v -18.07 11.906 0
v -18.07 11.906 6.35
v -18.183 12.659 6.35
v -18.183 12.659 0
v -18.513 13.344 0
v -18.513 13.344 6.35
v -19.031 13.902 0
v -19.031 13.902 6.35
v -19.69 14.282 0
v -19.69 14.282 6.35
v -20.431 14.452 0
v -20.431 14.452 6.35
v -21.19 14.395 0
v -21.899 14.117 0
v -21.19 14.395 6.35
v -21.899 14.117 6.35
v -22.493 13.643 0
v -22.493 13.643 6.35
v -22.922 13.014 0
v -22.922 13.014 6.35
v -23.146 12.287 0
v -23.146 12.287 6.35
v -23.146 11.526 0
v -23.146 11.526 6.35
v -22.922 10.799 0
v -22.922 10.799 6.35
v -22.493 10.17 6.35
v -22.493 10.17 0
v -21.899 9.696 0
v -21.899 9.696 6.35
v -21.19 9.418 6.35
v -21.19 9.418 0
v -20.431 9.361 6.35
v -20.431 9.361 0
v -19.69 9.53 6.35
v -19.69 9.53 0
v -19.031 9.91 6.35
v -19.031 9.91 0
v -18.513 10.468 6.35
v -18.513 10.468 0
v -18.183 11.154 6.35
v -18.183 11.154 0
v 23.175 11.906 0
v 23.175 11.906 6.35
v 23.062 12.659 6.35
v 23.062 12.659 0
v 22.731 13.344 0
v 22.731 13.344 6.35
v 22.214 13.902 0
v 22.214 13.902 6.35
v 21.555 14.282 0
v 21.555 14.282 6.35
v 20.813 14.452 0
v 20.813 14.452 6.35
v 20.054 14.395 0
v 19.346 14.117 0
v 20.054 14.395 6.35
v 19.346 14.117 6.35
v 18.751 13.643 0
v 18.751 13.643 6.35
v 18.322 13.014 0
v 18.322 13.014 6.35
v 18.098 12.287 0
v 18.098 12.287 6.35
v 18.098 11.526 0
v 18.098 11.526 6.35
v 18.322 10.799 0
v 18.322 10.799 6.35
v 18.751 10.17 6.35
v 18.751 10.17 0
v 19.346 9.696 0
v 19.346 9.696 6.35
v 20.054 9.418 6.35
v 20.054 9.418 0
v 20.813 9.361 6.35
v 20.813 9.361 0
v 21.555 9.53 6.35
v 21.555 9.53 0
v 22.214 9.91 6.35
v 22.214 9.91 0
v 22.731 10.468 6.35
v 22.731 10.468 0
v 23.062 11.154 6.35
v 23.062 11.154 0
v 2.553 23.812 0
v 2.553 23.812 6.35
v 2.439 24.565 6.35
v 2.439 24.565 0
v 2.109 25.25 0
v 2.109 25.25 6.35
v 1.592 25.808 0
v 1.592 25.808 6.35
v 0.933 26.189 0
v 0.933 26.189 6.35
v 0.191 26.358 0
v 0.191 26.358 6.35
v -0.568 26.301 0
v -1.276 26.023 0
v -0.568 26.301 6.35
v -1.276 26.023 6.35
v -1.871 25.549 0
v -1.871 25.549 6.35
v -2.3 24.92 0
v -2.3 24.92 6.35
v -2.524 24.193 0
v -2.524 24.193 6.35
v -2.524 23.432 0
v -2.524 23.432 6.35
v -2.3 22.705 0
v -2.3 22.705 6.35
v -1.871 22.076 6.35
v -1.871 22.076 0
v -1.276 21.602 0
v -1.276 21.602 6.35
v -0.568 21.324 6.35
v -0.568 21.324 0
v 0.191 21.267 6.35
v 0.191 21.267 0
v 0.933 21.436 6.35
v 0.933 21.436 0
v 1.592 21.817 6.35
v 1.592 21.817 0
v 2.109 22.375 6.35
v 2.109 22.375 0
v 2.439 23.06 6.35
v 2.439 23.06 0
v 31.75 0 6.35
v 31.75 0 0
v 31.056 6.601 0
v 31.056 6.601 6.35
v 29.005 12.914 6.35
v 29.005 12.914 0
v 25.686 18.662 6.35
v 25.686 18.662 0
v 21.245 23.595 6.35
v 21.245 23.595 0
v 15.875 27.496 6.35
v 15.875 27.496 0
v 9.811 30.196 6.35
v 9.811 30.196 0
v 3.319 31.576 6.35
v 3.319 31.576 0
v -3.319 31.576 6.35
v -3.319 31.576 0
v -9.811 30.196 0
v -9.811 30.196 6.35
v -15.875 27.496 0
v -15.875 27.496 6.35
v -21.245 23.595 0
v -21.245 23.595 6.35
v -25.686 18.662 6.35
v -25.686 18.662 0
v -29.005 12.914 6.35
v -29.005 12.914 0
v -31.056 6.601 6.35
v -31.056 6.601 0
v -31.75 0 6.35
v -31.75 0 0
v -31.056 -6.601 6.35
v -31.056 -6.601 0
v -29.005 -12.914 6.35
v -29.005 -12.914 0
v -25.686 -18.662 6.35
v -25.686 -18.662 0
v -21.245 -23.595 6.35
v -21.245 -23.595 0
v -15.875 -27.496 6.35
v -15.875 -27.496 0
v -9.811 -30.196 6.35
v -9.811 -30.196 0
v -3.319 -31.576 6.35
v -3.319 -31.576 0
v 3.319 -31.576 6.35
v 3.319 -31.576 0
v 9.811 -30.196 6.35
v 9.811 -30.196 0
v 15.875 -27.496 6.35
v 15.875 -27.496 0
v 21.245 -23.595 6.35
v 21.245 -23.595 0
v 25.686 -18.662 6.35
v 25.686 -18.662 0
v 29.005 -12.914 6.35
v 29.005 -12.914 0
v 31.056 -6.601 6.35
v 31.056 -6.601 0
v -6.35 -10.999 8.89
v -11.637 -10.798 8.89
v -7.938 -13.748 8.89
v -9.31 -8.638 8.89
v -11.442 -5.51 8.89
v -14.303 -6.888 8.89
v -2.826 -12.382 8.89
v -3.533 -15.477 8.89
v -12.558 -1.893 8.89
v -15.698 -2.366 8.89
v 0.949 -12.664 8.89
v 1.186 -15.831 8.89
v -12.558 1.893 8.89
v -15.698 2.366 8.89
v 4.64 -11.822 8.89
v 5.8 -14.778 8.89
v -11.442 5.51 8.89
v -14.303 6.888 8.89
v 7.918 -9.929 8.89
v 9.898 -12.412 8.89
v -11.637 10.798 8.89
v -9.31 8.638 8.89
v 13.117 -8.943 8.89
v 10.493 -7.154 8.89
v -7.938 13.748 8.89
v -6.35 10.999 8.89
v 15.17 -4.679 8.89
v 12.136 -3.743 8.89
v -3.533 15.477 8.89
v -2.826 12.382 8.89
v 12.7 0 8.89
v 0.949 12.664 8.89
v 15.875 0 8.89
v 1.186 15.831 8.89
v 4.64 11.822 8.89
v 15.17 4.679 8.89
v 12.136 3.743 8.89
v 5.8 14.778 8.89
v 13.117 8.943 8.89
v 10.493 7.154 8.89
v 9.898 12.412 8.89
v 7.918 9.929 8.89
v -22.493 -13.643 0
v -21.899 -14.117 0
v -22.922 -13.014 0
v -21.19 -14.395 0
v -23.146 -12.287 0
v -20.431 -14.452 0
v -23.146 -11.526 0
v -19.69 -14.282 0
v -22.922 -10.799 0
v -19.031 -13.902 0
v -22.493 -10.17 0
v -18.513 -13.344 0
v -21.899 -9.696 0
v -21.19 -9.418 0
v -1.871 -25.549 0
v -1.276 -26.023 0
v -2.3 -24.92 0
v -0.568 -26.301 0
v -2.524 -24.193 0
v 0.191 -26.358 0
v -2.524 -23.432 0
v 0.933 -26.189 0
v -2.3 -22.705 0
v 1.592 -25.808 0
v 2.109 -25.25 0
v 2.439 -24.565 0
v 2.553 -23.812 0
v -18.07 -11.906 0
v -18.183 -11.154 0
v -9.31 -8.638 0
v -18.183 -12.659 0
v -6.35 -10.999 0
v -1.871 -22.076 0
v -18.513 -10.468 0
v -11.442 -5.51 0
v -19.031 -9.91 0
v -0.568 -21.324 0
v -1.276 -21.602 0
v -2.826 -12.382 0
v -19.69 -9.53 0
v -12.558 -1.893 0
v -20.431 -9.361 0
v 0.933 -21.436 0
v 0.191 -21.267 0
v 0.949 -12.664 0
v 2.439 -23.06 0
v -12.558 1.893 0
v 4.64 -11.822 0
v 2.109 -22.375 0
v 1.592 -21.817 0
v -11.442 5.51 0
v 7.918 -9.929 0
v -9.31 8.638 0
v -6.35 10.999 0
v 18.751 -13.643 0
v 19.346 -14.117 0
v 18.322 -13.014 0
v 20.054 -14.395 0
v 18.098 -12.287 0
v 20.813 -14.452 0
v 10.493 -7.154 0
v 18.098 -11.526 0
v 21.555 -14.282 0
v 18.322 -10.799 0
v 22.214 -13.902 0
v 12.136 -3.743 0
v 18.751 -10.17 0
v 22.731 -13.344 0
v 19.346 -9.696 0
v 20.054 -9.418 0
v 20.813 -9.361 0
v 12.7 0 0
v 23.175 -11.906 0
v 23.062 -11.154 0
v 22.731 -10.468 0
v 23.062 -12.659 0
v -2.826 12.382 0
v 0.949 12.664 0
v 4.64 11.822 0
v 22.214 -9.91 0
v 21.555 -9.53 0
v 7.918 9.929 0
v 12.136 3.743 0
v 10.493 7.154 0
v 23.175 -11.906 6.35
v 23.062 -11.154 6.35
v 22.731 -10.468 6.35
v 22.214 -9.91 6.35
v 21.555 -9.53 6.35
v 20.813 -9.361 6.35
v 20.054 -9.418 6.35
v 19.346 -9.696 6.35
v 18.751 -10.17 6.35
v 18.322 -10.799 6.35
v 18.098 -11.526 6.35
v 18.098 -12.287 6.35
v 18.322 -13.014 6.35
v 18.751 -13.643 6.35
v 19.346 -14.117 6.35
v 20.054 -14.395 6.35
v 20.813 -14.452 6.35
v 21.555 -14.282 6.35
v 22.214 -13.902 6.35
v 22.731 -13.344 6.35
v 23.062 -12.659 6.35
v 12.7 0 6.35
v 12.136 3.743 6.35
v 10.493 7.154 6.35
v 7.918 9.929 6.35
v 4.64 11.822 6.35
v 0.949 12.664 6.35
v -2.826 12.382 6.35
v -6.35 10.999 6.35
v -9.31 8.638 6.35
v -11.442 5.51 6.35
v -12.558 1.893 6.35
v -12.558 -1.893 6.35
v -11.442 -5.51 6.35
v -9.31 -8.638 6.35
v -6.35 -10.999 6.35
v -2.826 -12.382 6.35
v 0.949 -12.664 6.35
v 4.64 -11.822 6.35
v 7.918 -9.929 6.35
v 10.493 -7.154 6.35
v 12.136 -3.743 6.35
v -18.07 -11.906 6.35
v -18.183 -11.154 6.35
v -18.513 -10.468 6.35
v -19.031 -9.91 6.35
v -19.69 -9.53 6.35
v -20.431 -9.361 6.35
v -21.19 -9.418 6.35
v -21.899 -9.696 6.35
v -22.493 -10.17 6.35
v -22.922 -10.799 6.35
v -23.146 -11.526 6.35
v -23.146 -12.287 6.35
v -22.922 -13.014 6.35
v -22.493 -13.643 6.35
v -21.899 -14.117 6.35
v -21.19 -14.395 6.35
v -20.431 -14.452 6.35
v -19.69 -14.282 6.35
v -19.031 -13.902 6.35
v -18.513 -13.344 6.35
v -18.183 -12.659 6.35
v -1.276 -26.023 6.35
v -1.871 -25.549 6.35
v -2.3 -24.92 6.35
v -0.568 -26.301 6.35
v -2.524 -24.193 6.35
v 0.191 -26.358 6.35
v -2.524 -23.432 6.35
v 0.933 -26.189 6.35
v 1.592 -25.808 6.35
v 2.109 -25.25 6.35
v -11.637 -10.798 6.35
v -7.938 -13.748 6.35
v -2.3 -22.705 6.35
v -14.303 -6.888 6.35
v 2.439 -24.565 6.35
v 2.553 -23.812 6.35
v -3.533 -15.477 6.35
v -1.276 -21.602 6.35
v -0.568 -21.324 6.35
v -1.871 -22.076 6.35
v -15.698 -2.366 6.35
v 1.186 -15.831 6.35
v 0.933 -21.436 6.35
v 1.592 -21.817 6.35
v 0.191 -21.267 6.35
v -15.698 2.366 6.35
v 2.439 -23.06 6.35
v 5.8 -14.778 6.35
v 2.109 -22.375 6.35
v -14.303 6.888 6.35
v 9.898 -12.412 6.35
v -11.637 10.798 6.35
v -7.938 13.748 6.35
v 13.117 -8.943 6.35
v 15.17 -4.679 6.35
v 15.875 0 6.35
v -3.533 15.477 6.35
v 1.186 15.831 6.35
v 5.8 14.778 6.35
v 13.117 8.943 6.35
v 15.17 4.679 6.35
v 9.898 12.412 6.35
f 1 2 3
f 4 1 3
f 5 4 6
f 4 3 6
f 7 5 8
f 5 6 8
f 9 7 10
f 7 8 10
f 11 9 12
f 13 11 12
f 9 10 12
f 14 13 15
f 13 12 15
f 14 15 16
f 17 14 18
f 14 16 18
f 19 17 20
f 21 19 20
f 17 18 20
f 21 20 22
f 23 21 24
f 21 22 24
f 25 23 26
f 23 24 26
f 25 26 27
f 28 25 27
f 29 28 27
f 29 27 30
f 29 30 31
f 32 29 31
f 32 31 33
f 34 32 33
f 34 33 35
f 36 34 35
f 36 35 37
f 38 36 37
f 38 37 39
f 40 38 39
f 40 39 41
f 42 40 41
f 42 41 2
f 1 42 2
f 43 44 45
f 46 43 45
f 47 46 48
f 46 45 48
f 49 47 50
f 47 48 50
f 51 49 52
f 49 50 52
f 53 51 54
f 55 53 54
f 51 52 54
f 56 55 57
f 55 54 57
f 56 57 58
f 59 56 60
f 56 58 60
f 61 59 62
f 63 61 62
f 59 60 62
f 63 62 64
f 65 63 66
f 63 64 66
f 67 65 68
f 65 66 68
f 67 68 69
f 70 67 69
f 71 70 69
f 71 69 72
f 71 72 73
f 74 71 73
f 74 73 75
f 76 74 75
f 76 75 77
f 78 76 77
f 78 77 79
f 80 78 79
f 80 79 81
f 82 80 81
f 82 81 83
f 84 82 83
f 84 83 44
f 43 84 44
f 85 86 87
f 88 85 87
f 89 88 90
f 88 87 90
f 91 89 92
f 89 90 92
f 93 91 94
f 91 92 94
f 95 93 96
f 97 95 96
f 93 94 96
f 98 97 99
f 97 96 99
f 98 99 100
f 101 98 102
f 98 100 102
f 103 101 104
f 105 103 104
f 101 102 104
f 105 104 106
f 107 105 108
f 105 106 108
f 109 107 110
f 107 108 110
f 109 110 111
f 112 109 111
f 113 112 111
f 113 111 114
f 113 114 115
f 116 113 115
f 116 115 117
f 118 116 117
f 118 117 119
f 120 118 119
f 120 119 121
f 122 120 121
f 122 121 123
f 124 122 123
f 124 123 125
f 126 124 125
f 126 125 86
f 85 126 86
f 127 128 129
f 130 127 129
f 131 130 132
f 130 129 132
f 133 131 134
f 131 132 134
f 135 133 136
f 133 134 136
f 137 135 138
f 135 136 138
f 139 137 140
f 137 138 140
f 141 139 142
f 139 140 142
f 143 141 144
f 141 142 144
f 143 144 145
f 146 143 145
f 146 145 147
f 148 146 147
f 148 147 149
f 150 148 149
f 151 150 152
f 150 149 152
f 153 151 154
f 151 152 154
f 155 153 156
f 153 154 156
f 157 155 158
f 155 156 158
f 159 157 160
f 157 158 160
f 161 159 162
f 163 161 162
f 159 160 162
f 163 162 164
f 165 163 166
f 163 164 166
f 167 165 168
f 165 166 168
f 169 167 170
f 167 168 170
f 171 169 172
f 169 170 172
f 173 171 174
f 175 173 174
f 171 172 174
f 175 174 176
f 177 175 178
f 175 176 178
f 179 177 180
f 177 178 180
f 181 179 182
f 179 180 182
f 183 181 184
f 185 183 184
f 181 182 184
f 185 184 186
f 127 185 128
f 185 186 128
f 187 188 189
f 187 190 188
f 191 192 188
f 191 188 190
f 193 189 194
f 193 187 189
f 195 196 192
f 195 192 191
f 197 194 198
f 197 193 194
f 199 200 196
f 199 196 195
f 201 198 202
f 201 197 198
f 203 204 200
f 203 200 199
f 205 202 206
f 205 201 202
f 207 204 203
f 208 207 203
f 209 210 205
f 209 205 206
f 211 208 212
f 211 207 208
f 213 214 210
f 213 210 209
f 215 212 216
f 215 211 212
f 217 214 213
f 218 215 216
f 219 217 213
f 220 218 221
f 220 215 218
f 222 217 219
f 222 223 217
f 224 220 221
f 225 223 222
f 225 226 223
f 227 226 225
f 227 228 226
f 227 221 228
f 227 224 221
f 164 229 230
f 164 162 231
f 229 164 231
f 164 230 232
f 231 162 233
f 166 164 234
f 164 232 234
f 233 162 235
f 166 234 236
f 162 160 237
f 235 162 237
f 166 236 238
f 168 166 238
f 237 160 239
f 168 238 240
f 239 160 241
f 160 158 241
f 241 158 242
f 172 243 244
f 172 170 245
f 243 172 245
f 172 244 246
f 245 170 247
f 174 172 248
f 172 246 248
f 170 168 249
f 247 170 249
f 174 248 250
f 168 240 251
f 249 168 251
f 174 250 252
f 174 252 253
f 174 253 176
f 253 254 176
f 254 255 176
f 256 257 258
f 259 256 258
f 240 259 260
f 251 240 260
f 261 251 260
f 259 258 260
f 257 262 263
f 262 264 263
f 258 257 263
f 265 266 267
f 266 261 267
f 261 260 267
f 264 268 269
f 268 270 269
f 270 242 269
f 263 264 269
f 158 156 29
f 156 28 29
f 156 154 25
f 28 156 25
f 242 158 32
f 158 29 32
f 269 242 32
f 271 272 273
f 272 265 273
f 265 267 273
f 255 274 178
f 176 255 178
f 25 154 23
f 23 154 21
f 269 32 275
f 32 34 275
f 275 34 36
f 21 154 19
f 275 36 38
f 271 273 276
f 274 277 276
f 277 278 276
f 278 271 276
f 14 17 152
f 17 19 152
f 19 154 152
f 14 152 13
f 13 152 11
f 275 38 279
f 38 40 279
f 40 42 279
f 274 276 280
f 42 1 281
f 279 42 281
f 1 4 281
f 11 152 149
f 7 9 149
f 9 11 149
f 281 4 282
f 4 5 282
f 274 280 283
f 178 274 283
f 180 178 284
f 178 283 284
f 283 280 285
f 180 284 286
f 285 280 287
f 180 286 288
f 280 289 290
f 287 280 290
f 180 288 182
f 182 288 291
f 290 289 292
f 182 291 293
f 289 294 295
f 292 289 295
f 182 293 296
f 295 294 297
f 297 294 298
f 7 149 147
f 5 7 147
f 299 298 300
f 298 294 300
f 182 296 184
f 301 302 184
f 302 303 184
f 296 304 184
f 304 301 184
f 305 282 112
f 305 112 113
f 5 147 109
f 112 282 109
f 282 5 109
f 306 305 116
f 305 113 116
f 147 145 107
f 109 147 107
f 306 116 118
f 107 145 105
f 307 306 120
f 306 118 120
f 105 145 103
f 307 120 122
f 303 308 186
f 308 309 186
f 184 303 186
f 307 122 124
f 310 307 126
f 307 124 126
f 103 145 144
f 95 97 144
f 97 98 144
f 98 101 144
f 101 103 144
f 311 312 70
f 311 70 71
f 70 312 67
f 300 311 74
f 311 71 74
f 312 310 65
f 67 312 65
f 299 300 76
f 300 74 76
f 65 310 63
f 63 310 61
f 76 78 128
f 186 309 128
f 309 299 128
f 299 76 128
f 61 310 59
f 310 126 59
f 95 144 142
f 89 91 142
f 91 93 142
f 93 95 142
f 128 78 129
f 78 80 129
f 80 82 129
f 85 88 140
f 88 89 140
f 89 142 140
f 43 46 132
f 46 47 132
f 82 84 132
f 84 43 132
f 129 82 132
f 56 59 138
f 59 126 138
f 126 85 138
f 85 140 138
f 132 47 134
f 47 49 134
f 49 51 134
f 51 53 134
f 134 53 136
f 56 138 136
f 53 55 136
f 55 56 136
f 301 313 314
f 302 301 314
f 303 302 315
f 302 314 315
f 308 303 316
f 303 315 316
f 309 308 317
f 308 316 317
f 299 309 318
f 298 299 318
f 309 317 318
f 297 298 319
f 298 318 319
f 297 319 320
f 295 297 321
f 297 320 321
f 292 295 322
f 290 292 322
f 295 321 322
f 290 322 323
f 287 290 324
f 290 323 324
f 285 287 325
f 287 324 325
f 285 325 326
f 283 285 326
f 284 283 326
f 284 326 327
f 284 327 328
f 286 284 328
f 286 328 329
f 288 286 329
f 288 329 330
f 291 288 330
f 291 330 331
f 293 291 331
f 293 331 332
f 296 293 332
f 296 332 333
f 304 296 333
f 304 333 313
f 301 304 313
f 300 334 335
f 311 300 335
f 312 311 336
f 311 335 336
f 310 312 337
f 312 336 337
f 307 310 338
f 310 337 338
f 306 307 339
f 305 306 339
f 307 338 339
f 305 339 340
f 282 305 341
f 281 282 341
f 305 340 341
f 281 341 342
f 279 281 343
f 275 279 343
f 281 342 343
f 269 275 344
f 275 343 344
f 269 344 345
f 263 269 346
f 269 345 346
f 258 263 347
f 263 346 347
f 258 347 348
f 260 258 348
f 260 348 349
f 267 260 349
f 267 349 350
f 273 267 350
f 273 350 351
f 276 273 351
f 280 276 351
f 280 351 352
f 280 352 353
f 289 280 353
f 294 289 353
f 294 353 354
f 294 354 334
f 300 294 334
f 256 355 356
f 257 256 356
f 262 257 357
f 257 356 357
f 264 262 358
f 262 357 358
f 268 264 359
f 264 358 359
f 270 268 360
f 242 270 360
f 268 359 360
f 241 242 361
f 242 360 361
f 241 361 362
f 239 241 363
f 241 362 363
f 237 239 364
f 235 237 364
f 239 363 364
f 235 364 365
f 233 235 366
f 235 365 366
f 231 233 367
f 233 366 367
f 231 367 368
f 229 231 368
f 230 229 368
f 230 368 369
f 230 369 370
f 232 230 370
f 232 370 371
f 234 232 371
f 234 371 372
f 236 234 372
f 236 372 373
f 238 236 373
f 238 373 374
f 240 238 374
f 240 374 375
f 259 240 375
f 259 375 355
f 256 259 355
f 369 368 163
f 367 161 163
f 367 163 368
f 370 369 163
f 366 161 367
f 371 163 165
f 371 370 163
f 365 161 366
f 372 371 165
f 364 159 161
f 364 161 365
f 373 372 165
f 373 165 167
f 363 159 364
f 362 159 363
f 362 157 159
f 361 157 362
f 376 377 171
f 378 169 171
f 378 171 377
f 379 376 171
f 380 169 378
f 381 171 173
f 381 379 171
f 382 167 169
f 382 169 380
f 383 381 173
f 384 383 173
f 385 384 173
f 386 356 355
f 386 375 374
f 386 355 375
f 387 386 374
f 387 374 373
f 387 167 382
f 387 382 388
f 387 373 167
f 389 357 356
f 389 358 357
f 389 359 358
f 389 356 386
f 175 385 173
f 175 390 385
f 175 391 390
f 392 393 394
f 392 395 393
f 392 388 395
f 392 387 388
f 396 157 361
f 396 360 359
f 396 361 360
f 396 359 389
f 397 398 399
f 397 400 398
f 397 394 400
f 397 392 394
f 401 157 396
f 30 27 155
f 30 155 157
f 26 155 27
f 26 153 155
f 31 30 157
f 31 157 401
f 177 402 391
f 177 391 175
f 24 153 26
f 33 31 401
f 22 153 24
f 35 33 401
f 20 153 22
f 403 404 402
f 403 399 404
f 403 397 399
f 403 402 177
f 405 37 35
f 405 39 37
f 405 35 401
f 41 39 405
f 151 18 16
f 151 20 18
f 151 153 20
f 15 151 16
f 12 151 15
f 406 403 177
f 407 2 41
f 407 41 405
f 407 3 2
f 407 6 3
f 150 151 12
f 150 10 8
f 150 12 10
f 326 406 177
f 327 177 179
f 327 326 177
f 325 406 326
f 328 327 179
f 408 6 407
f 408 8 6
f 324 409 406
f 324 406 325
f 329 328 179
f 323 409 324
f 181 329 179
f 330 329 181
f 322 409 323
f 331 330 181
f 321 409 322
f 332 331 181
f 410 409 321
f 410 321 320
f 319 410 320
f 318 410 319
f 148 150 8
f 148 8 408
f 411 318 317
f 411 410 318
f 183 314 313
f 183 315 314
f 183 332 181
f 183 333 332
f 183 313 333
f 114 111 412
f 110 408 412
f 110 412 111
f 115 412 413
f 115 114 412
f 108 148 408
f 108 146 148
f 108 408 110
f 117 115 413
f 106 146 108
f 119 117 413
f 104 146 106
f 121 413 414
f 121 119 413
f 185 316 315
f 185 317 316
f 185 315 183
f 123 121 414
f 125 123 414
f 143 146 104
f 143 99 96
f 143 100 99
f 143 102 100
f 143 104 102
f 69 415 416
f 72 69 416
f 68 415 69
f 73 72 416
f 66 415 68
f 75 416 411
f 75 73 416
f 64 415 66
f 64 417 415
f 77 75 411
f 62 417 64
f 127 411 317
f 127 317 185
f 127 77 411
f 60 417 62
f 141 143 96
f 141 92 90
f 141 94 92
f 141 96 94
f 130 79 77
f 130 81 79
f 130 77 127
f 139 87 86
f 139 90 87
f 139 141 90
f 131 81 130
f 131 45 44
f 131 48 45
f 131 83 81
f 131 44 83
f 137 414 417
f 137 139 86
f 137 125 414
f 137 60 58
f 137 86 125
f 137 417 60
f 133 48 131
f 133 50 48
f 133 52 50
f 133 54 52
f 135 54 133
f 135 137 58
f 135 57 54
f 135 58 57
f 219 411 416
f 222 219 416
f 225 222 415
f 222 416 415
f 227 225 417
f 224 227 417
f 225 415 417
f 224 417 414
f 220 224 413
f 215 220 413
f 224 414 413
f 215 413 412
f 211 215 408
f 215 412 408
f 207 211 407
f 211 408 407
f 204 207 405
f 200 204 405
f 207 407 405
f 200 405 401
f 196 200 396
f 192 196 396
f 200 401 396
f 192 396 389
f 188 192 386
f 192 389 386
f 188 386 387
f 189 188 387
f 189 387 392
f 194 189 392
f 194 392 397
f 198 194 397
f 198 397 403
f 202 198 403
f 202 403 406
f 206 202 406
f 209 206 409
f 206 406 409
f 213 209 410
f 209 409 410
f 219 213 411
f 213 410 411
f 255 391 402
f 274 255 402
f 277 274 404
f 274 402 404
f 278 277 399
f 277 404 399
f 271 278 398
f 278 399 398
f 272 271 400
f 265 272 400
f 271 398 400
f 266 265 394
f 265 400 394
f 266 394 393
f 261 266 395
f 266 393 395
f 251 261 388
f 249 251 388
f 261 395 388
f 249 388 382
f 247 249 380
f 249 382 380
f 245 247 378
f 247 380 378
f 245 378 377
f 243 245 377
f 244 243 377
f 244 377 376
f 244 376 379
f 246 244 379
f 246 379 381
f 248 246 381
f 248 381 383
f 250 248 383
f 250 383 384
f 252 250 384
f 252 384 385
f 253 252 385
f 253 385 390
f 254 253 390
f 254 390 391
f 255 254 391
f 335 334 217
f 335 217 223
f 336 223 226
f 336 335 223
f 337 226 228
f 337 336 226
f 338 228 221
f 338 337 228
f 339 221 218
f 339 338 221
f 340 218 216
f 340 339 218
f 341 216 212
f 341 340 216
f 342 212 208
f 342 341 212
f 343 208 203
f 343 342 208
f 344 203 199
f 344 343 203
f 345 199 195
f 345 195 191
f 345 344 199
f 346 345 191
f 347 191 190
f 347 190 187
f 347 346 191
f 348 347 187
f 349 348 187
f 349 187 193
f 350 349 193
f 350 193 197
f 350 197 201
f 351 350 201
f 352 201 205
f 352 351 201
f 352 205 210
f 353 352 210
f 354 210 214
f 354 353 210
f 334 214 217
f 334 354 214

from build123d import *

# Parameters (mm, degrees)
SKETCH1_R           = 31.75
BOSS_EXTRUDE1_DEPTH = 6.35
SKETCH2_R           = 12.7
SKETCH2_R_2         = 2.5527
CUT_EXTRUDE1_DEPTH  = 7.35
SKETCH3_R           = 15.875
SKETCH3_R_2         = 12.7
BOSS_EXTRUDE2_DEPTH = 2.54


with BuildPart() as part:
    # Sketch1 → Boss-Extrude1 (new body)
    with BuildSketch(Plane.XY):
        Circle(SKETCH1_R)
    extrude(amount=BOSS_EXTRUDE1_DEPTH)

    # Sketch2 → Cut-Extrude1 (cut, through all)
    with BuildSketch(Plane.XY.offset(6.35)):
        Circle(SKETCH2_R)
        with Locations((0, 23.8125)):
            Circle(SKETCH2_R_2)
        with Locations((20.622229928, 11.90625)):
            Circle(SKETCH2_R_2)
        with Locations((20.622229928, -11.90625)):
            Circle(SKETCH2_R_2)
        with Locations((0, -23.8125)):
            Circle(SKETCH2_R_2)
        with Locations((-20.622229928, -11.90625)):
            Circle(SKETCH2_R_2)
        with Locations((-20.622229928, 11.90625)):
            Circle(SKETCH2_R_2)
    extrude(amount=-CUT_EXTRUDE1_DEPTH, mode=Mode.SUBTRACT)

    # Sketch3 → Boss-Extrude2 (add)
    with BuildSketch(Plane.XY.offset(6.35)):
        Circle(SKETCH3_R)
        Circle(SKETCH3_R_2, mode=Mode.SUBTRACT)
    extrude(amount=BOSS_EXTRUDE2_DEPTH)


solid = part.part
